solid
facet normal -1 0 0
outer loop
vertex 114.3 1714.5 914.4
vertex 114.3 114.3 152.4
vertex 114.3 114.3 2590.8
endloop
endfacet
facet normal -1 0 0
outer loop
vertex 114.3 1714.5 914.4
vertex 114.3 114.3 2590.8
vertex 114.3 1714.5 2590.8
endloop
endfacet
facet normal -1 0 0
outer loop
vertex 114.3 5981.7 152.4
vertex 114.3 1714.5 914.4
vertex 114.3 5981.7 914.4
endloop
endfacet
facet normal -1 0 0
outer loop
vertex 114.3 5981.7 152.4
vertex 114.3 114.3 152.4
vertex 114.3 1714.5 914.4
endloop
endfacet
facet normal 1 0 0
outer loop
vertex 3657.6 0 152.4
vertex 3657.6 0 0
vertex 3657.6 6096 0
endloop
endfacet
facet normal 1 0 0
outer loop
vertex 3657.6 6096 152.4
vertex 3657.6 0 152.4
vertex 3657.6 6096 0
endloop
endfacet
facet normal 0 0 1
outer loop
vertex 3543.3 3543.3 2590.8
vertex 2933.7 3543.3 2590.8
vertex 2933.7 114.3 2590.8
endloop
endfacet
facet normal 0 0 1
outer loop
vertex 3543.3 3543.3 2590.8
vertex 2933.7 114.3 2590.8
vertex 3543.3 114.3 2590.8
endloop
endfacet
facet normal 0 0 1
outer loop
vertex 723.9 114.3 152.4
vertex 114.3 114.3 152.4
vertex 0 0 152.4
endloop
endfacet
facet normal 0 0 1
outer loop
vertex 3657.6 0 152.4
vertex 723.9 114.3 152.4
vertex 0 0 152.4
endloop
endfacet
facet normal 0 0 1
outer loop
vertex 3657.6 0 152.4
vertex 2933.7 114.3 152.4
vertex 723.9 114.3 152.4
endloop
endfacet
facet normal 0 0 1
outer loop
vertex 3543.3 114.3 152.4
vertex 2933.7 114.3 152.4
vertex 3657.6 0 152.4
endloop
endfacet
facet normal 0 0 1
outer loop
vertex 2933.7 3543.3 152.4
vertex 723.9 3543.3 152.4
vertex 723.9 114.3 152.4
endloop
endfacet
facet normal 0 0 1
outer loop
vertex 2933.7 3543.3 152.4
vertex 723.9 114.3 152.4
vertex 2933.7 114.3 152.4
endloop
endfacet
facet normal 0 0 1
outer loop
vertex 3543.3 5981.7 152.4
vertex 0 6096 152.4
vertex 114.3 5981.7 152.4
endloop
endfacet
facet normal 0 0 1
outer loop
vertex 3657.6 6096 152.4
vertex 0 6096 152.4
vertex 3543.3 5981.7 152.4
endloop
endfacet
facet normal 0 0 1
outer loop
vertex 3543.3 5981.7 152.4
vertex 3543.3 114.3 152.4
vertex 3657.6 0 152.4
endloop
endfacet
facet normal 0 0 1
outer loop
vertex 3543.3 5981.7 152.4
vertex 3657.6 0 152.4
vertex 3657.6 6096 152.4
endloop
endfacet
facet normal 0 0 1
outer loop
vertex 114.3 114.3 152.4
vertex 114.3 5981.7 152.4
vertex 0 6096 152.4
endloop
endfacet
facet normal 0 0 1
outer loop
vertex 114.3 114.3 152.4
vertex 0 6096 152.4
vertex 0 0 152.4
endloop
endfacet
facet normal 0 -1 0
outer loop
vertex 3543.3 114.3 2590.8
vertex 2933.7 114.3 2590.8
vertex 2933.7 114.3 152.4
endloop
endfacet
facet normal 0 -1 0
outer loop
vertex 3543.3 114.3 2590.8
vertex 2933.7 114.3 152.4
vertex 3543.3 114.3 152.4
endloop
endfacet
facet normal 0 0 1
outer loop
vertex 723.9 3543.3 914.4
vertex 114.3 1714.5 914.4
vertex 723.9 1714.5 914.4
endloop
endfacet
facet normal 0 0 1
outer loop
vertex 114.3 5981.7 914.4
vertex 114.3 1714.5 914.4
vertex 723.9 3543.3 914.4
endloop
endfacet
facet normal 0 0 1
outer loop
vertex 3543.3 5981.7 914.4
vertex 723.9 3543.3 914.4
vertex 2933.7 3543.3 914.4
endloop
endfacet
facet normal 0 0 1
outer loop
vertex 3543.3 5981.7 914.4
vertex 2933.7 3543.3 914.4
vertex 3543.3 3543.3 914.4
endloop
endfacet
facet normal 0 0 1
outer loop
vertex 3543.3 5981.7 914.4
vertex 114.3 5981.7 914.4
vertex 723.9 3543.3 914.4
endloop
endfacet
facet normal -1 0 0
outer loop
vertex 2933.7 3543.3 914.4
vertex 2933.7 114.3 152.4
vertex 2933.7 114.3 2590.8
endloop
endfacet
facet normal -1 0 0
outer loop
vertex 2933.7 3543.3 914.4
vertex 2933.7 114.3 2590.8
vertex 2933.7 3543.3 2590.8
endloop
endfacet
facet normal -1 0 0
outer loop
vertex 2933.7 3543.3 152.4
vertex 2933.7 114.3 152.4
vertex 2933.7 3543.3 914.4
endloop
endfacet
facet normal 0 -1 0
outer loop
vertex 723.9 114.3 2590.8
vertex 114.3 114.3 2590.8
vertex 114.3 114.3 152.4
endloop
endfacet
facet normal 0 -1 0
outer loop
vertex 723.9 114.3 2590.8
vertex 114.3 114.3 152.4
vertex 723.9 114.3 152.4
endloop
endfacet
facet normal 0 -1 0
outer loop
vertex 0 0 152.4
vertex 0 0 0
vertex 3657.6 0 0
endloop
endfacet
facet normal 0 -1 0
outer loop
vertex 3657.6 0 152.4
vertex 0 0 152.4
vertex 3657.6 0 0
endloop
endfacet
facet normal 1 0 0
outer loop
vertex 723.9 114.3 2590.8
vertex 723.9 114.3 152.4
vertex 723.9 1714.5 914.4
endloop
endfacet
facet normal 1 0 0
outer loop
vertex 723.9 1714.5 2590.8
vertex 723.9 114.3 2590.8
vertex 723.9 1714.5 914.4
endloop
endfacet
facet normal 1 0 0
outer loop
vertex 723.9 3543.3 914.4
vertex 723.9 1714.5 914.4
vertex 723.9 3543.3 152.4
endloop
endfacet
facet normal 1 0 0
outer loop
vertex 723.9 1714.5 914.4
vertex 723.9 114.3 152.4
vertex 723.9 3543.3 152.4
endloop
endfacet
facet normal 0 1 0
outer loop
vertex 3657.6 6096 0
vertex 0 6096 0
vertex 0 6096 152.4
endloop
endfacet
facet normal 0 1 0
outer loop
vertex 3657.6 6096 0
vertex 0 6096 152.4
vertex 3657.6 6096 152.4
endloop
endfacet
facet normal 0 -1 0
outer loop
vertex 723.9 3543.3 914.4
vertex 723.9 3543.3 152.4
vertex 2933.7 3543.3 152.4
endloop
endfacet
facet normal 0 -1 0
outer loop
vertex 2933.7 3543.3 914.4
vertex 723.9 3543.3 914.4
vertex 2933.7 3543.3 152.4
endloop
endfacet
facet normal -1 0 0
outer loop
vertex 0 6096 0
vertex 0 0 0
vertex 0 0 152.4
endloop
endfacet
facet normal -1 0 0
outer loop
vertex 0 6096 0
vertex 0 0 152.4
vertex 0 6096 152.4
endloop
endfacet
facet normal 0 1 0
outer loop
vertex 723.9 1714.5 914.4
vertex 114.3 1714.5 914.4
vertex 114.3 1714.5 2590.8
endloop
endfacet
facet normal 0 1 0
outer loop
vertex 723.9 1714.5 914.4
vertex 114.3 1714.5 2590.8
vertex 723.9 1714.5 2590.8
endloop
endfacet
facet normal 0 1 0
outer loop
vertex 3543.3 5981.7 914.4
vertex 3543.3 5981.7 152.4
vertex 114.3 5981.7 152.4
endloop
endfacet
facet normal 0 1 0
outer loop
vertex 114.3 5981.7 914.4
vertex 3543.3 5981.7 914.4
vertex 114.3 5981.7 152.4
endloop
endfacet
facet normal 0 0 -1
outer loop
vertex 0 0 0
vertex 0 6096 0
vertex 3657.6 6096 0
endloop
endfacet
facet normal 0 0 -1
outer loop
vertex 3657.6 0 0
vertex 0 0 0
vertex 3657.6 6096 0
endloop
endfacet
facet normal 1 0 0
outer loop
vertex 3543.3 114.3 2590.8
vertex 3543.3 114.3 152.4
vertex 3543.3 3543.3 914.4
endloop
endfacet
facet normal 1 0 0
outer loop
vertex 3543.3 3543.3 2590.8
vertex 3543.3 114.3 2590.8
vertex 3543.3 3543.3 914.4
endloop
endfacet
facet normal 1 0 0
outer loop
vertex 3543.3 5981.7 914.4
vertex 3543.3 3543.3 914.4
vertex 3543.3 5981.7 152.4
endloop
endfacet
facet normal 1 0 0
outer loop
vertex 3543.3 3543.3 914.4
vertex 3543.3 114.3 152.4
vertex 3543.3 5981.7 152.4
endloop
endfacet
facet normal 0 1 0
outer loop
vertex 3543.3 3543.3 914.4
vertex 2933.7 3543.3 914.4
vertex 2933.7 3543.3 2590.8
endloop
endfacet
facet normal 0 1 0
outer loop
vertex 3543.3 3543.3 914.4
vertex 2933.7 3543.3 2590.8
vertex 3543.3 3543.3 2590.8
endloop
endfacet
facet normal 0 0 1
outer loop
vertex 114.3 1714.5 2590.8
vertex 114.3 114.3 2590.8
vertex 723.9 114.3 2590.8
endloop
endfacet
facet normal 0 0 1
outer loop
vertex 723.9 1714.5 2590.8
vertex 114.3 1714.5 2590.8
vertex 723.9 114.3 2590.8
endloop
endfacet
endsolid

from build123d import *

# Parameters (mm, degrees)
F0_W     = 3657.6
F0_H     = 6096
F1_DEPTH = 152.4
F2_W     = 609.6
F2_H     = 1828.8
F3_DEPTH = 762
F2_H_2   = 1600.2
F2_H_3   = 3429
F4_DEPTH = 2438.4


with BuildPart() as f1:
    # F0 (on Top) → F1 (new body)
    with BuildSketch(Plane.XY):
        with Locations((1828.8, 3048)):
            Rectangle(F0_W, F0_H)
    extrude(amount=F1_DEPTH)

    # F2 (on face) → F3 (join)
    with BuildSketch(Plane.XY.offset(152.4)):
        Polygon((3543.3, 5981.7), (114.3, 5981.7), (114.3, 3543.3), (723.9, 3543.3), (2933.7, 3543.3), (3543.3, 3543.3), align=None)
        with Locations((419.1, 2628.9)):
            Rectangle(F2_W, F2_H)
    extrude(amount=F3_DEPTH)

    # F2 (on face) → F4 (join)
    with BuildSketch(Plane.XY.offset(152.4)):
        with Locations((419.1, 914.4)):
            Rectangle(F2_W, F2_H_2)
        with Locations((3238.5, 1828.8)):
            Rectangle(F2_W, F2_H_3)
    extrude(amount=F4_DEPTH)


solid = f1.part
